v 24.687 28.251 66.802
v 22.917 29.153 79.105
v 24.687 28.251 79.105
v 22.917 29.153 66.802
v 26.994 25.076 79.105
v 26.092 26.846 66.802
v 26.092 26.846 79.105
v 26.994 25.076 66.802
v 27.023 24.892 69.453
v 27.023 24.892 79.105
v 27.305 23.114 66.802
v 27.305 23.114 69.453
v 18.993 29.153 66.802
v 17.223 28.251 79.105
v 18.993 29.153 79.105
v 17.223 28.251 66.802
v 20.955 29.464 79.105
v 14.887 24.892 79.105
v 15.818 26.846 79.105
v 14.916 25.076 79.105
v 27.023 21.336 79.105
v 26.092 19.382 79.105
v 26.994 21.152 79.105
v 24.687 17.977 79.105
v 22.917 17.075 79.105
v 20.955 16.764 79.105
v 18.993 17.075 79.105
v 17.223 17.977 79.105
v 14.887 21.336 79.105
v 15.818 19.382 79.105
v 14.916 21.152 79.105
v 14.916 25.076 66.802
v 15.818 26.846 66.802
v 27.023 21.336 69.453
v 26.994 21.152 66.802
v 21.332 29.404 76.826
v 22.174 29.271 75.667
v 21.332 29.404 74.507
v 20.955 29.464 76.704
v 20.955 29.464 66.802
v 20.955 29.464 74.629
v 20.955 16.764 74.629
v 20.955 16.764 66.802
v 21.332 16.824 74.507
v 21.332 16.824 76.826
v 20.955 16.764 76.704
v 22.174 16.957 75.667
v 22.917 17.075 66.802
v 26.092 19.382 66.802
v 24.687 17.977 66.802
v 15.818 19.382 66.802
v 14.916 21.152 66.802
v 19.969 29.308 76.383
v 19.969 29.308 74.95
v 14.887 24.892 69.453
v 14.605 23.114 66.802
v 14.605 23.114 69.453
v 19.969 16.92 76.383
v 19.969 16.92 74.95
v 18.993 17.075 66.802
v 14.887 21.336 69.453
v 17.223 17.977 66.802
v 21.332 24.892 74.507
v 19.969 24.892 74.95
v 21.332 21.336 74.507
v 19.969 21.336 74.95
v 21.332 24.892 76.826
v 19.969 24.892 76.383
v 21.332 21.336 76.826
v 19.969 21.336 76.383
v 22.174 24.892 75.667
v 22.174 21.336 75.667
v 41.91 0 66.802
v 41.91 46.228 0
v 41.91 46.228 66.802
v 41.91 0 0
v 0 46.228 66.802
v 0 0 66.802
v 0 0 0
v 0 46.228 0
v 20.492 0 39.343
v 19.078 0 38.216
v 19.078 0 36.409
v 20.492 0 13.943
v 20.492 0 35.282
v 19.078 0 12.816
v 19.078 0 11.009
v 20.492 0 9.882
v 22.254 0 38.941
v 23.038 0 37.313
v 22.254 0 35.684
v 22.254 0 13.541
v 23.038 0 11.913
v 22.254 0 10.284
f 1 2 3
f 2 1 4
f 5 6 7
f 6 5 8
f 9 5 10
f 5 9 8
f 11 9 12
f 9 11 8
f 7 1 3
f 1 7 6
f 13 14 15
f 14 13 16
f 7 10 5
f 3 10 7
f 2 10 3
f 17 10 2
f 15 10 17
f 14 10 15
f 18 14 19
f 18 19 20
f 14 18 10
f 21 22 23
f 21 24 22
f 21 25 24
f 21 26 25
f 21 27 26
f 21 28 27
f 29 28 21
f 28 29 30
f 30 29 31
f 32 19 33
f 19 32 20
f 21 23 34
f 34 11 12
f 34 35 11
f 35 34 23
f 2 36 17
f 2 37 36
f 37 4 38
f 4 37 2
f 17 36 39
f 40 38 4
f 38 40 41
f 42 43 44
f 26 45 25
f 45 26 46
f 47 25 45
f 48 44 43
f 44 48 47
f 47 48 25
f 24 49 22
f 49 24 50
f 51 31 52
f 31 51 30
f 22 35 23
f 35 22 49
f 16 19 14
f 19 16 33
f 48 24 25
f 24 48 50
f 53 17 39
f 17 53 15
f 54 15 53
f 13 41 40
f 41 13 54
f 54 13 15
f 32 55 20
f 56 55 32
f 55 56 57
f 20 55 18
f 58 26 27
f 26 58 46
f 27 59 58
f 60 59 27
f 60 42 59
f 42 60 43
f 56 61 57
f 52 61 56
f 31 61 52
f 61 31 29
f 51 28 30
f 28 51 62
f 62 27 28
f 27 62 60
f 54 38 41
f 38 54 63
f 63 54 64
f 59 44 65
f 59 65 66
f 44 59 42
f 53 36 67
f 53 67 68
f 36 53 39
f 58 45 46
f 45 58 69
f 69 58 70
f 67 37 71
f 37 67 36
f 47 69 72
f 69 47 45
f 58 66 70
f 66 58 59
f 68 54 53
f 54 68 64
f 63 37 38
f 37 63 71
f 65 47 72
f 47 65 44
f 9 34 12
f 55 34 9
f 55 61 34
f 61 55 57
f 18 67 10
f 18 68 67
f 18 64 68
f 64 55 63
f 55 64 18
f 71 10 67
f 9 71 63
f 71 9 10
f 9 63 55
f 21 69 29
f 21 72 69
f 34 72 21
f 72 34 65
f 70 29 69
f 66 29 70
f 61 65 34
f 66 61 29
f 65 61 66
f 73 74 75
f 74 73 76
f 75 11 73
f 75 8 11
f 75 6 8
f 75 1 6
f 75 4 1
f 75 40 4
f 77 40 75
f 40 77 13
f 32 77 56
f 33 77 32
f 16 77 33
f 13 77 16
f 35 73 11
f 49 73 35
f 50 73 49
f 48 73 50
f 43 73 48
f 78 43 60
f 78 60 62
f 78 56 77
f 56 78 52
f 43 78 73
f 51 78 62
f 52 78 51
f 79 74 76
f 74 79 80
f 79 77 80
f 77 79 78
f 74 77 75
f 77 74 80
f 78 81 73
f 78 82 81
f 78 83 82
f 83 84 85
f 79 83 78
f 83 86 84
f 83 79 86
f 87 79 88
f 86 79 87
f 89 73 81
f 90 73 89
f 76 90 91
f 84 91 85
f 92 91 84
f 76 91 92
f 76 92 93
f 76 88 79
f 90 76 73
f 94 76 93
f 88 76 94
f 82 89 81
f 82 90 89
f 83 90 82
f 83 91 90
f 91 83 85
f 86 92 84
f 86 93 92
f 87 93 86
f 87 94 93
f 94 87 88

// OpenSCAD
PCL90();

module PCL90(){
    
x=41.91;
y=46.228;
z=66.802;

topz=37.3126;  ///distance from base to center of top mount hole
top2stroke0=38.354;
top2stroke1=70.104;  
plungerholeD=2.4384;
plungercutZ=9.652;
plungercutY=3.556;    

holeOD=4.1656;
botz=topz-25.4;

D=12.7;

difference(){
    union(){
cube([x,y,z]);
translate([x/2,y/2,topz])
    difference(){
cylinder(d=D,h=top2stroke0+(plungerholeD)+1);
translate([0,D/2,top2stroke0])
rotate([90,0,0])     
#cylinder(d=plungerholeD,h=D);     
translate([-D/2,-plungercutY/2,top2stroke0+(plungerholeD)+1-plungercutZ])
#cube([D,plungercutY,plungercutZ]);       
    }
}
translate([x/2,0,topz])
    rotate([90,0,0])
cylinder(d=holeOD,h=y);

translate([x/2,0,botz])
    rotate([90,0,0])
cylinder(d=holeOD,h=y);


}//end main diff    
    
    
}//end module
